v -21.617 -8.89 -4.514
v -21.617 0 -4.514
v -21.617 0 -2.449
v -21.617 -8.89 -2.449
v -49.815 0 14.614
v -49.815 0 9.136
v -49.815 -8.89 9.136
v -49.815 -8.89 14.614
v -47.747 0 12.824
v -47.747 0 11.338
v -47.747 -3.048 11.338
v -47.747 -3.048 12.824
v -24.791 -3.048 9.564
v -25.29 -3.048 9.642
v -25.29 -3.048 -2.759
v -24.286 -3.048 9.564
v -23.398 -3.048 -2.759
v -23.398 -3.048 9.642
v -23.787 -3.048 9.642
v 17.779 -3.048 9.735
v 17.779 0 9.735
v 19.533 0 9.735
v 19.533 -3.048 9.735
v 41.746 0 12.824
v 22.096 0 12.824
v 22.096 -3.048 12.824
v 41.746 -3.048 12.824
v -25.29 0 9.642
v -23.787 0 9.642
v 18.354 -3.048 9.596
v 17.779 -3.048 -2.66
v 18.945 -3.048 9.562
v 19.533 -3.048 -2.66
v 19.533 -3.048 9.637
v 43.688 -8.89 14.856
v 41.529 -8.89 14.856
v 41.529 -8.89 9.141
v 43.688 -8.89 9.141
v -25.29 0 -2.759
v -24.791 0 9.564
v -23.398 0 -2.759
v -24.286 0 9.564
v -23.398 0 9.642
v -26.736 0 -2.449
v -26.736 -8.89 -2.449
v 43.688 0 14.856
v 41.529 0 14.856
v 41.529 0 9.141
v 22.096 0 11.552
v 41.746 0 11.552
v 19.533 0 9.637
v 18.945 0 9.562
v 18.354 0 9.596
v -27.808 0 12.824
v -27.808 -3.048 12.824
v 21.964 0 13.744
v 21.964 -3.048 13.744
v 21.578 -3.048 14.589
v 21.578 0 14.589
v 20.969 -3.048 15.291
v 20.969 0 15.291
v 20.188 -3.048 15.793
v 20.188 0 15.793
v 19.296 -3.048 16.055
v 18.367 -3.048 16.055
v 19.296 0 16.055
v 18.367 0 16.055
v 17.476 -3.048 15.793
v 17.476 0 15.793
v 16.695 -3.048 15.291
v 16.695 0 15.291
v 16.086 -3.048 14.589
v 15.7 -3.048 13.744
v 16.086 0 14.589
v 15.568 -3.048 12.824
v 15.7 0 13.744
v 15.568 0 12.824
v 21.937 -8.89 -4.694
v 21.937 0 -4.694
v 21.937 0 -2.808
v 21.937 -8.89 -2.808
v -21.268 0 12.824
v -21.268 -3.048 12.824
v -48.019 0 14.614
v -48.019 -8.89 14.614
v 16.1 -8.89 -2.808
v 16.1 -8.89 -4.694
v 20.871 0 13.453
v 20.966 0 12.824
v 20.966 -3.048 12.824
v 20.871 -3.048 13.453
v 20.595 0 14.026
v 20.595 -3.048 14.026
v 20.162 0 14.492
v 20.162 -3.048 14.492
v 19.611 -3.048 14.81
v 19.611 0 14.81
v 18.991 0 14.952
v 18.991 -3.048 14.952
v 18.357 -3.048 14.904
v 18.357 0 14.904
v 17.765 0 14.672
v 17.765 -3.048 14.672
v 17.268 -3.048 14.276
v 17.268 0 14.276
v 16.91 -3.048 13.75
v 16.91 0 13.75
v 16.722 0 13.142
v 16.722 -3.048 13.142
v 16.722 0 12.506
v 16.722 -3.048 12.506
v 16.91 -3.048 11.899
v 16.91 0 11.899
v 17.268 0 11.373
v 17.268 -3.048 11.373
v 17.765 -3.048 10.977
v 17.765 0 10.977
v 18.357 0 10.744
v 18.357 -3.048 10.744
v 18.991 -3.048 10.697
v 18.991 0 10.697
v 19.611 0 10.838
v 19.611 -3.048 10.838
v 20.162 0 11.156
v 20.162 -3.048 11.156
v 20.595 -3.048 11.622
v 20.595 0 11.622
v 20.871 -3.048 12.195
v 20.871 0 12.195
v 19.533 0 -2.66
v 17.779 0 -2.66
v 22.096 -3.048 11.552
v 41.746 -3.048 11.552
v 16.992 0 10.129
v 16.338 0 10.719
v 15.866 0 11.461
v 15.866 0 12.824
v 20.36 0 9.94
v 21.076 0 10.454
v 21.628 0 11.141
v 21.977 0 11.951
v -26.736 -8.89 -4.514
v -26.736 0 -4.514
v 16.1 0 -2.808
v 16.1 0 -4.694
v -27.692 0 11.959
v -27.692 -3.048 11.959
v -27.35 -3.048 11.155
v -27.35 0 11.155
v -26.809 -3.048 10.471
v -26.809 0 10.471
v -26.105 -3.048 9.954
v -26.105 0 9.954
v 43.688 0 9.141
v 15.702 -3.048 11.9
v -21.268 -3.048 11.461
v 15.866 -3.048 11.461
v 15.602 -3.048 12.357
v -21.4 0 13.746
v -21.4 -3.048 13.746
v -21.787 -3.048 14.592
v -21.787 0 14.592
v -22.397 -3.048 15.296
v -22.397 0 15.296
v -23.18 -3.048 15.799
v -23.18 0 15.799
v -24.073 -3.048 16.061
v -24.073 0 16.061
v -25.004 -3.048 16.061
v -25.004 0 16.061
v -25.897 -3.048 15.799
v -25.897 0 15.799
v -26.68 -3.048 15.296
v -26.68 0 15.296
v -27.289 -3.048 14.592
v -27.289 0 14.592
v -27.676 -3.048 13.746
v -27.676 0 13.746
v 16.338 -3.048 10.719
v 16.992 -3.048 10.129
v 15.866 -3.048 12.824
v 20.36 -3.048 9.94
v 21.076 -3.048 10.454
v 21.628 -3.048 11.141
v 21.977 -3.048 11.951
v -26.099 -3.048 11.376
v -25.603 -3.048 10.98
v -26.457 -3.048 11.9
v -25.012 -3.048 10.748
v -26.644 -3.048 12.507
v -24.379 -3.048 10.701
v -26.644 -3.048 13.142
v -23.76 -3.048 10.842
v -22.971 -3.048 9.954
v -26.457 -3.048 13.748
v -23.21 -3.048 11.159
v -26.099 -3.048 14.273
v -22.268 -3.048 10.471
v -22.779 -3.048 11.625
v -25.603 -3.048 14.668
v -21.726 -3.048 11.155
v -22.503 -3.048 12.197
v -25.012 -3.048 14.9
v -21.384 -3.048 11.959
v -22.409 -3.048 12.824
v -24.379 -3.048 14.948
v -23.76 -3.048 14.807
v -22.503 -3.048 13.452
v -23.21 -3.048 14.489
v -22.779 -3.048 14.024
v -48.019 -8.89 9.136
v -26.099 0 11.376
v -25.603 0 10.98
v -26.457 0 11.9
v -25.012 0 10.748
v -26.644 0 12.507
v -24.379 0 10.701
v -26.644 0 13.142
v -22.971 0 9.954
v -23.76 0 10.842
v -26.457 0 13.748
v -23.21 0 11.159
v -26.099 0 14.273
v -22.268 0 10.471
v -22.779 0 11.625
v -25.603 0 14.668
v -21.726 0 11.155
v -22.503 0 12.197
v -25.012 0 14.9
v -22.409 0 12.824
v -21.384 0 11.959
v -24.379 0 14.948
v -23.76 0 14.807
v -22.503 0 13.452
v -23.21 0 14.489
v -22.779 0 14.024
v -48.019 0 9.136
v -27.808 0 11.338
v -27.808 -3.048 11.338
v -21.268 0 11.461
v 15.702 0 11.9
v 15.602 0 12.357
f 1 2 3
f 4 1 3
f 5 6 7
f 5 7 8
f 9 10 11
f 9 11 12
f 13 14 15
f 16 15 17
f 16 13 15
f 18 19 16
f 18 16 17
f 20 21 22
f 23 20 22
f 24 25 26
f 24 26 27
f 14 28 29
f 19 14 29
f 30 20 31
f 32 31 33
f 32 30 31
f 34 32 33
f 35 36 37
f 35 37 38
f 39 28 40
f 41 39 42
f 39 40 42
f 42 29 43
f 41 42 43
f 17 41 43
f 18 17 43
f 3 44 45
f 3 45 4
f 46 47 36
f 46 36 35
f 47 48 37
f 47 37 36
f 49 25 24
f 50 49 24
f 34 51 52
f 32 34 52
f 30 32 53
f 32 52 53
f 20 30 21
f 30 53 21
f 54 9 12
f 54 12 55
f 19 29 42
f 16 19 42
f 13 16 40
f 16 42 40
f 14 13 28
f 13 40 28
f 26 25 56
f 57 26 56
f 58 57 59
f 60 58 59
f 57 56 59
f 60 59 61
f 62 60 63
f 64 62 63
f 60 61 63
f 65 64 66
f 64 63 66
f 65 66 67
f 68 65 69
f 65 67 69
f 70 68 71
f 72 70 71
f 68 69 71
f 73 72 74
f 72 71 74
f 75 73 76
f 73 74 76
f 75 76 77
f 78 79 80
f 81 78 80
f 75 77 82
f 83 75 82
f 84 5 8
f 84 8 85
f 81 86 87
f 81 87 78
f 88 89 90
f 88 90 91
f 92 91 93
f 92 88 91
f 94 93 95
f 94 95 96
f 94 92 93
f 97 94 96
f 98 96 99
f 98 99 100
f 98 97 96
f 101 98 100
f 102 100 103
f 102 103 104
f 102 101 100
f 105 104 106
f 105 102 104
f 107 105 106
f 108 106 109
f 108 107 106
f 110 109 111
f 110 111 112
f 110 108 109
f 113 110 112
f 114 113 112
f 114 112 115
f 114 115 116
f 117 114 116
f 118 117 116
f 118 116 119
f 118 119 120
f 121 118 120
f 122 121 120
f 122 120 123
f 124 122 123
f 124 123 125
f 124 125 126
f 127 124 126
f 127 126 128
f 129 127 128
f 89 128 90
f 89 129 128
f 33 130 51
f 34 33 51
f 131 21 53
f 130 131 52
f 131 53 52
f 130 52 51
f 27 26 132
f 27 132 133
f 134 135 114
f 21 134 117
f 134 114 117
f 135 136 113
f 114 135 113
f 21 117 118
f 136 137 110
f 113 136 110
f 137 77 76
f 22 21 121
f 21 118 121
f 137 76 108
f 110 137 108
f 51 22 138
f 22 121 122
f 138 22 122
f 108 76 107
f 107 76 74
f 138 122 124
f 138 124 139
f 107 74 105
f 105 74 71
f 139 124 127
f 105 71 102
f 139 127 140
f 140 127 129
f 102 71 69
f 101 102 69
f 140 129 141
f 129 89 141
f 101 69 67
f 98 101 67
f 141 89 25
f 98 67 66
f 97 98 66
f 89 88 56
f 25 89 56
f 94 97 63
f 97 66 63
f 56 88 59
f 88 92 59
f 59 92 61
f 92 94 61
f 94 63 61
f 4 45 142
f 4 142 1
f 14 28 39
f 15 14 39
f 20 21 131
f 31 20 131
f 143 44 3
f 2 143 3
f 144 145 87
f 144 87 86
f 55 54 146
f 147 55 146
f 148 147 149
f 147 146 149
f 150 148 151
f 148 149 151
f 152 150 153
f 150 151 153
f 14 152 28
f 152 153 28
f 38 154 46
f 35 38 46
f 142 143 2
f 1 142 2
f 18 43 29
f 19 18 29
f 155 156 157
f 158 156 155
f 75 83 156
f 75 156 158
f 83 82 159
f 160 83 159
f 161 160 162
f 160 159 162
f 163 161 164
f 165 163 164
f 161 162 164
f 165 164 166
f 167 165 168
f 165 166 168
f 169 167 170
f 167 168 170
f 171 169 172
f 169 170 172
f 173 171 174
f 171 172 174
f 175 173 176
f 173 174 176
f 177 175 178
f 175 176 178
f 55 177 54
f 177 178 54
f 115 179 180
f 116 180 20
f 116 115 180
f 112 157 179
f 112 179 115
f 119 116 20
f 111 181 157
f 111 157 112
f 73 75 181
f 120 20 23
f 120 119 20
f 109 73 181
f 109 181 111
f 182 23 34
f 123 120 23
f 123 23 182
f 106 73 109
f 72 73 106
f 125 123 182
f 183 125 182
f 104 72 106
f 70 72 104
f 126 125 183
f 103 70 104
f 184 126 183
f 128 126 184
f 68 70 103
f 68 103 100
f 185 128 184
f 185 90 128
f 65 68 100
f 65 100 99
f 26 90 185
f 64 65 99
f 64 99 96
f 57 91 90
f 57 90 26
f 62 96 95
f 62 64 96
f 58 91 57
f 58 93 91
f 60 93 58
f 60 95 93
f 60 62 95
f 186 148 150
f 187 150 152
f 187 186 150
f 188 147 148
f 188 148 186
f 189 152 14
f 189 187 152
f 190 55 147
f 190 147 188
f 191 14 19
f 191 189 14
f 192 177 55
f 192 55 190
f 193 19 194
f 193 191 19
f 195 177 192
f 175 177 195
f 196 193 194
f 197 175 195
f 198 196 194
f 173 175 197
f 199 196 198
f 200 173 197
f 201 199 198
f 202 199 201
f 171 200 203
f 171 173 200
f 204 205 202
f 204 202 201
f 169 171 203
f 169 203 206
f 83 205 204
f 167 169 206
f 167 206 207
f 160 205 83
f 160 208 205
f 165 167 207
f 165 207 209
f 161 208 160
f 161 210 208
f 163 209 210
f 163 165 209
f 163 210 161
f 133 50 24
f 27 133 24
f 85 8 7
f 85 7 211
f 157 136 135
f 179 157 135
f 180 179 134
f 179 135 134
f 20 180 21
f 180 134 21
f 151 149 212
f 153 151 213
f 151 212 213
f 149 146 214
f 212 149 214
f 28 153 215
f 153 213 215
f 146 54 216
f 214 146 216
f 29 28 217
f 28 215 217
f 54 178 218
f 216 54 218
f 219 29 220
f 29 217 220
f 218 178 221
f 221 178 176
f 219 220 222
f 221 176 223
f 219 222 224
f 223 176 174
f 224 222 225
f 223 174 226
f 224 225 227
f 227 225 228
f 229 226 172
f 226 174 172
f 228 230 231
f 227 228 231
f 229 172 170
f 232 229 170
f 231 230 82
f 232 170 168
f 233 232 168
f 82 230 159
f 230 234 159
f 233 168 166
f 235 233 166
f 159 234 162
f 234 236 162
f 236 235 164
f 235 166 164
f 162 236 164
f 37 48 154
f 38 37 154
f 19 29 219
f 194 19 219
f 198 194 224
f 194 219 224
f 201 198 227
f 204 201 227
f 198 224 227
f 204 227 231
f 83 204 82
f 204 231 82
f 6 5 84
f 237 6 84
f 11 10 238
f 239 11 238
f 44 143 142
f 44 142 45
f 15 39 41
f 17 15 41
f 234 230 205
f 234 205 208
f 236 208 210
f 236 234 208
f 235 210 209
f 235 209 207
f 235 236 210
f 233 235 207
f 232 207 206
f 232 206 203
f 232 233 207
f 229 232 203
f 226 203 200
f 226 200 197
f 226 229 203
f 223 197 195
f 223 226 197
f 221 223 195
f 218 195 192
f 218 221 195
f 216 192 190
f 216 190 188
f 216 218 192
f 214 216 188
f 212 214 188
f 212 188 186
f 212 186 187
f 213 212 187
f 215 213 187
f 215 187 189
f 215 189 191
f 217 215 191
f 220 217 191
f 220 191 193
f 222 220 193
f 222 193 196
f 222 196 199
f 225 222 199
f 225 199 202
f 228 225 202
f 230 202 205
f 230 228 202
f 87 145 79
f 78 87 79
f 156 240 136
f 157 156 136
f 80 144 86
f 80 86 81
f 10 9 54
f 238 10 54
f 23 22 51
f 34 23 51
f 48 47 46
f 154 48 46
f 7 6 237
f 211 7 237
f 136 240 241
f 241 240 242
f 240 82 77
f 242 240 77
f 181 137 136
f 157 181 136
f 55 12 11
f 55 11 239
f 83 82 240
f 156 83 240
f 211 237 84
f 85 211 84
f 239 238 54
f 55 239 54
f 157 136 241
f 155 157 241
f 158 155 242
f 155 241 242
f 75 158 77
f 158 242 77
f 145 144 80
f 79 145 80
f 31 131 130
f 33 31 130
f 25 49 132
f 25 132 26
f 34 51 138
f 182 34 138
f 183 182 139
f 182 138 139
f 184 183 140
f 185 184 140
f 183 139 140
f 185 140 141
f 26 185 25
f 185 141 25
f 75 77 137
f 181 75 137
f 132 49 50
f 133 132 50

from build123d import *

# Parameters (mm, degrees)
F0_W     = 19.6500662714
F0_H     = 1.2726495042
F1_DEPTH = 3.048
F0_R     = 2.1336
F0_R_2   = 2.1294315388
F0_W_2   = 19.939
F0_H_2   = 1.4862371609
F2_W     = 1.7960518599
F2_H     = 5.4779564962
F3_DEPTH = 8.89
F2_W_2   = 5.1187463105
F2_H_2   = 2.0654590335
F2_W_3   = 5.8371666819
F2_H_3   = 1.8858539406
F2_W_4   = 2.1589994431
F2_H_4   = 5.7150004432


with BuildPart() as f1:
    # F0 (on Front) → F1 (new body)
    with BuildSketch(Plane.XZ):
        with Locations((31.9208344445, 12.1880299412)):
            Rectangle(F0_W, F0_H)
    extrude(amount=F1_DEPTH)


with BuildPart() as f1b:
    # F0 (on Front) → F1, piece 2 (new body)
    with BuildSketch(Plane.XZ):
        with BuildLine():
            ThreePointArc((22.0958013088, 12.8243546933), (18.8319013088, 16.0882546933), (15.5680013088, 12.8243546933))
            Line((15.5680013088, 12.8243546933), (15.8661592174, 12.8243546933))
            Line((15.8661592174, 12.8243546933), (15.8661592174, 11.4614838053))
            ThreePointArc((15.8661592174, 11.4614838053), (16.6448945696, 10.4015371738), (17.778771361, 9.7350245842))
            Line((17.778771361, 9.7350245842), (19.5327494293, 9.7350245842))
            Line((19.5327494293, 9.7350245842), (19.5327494293, 9.6365882147))
            ThreePointArc((19.5327494293, 9.6365882147), (21.3755739873, 10.7791719351), (22.0958013088, 12.8243546933))
        make_face()
        with Locations((18.8319013088, 12.8243546933)):
            Circle(F0_R, mode=Mode.SUBTRACT)
    extrude(amount=F1_DEPTH)


with BuildPart() as f1c:
    # F0 (on Front) → F1, piece 3 (new body)
    with BuildSketch(Plane.XZ):
        with BuildLine():
            Line((15.5680013088, 12.8243546933), (-21.2678752836, 12.8243546933))
            Line((-21.2678752836, 12.8243546933), (-21.2678752836, 11.4614838053))
            Line((-21.2678752836, 11.4614838053), (15.8661592174, 11.4614838053))
            ThreePointArc((15.8661592174, 11.4614838053), (15.6434119468, 12.1268026888), (15.5680013088, 12.8243546933))
        make_face()
    extrude(amount=F1_DEPTH)


with BuildPart() as f1d:
    # F0 (on Front) → F1, piece 4 (new body)
    with BuildSketch(Plane.XZ):
        with BuildLine():
            ThreePointArc((-23.7866874056, 9.6416087265), (-21.9737613738, 10.7949282722), (-21.2678752836, 12.8243546933))
            ThreePointArc((-21.2678752836, 12.8243546933), (-24.5381244323, 16.0946038419), (-27.8083735809, 12.8243546933))
            ThreePointArc((-27.8083735809, 12.8243546933), (-27.1024874907, 10.7949282722), (-25.2895614589, 9.6416087265))
            Line((-25.2895614589, 9.6416087265), (-23.7866874056, 9.6416087265))
        make_face()
        with Locations((-24.5381244323, 12.8243546933)):
            Circle(F0_R_2, mode=Mode.SUBTRACT)
    extrude(amount=F1_DEPTH)


with BuildPart() as f1e:
    # F0 (on Front) → F1, piece 5 (new body)
    with BuildSketch(Plane.XZ):
        with Locations((-37.7778735809, 12.0812361129)):
            Rectangle(F0_W_2, F0_H_2)
    extrude(amount=F1_DEPTH)


with BuildPart() as f1f:
    # F0 (on Front) → F1, piece 6 (new body)
    with BuildSketch(Plane.XZ):
        with BuildLine():
            Line((-23.3983788639, 9.6416087265), (-23.7866874056, 9.6416087265))
            ThreePointArc((-23.7866874056, 9.6416087265), (-24.5381244323, 9.5541055446), (-25.2895614589, 9.6416087265))
            Line((-25.2895614589, 9.6416087265), (-25.2895614589, -2.7586696669))
            Line((-25.2895614589, -2.7586696669), (-23.3983788639, -2.7586696669))
            Line((-23.3983788639, -2.7586696669), (-23.3983788639, 9.6416087265))
        make_face()
    extrude(amount=F1_DEPTH)


with BuildPart() as f1g:
    # F0 (on Front) → F1, piece 7 (new body)
    with BuildSketch(Plane.XZ):
        with BuildLine():
            Line((19.5327494293, -2.6601754158), (19.5327494293, 9.6365882147))
            ThreePointArc((19.5327494293, 9.6365882147), (18.6490132251, 9.5655826609), (17.778771361, 9.7350245842))
            Line((17.778771361, 9.7350245842), (17.778771361, -2.6601754158))
            Line((17.778771361, -2.6601754158), (19.5327494293, -2.6601754158))
        make_face()
    extrude(amount=F1_DEPTH)


with BuildPart() as f3:
    # F2 (on Front) → F3 (new body)
    with BuildSketch(Plane.XZ):
        with Locations((-48.9171035588, 11.8750003166)):
            Rectangle(F2_W, F2_H)
    extrude(amount=F3_DEPTH)


with BuildPart() as f3b:
    # F2 (on Front) → F3, piece 2 (new body)
    with BuildSketch(Plane.XZ):
        with Locations((-24.1764970124, -3.4812387312)):
            Rectangle(F2_W_2, F2_H_2)
    extrude(amount=F3_DEPTH)


with BuildPart() as f3c:
    # F2 (on Front) → F3, piece 3 (new body)
    with BuildSketch(Plane.XZ):
        with Locations((19.0185336396, -3.7506463705)):
            Rectangle(F2_W_3, F2_H_3)
    extrude(amount=F3_DEPTH)


with BuildPart() as f3d:
    # F2 (on Front) → F3, piece 4 (new body)
    with BuildSketch(Plane.XZ):
        with Locations((42.608499527, 11.9988550432)):
            Rectangle(F2_W_4, F2_H_4)
    extrude(amount=F3_DEPTH)


solid = Compound([f1.part, f1b.part, f1c.part, f1d.part, f1e.part, f1f.part, f1g.part, f3.part, f3b.part, f3c.part, f3d.part])
